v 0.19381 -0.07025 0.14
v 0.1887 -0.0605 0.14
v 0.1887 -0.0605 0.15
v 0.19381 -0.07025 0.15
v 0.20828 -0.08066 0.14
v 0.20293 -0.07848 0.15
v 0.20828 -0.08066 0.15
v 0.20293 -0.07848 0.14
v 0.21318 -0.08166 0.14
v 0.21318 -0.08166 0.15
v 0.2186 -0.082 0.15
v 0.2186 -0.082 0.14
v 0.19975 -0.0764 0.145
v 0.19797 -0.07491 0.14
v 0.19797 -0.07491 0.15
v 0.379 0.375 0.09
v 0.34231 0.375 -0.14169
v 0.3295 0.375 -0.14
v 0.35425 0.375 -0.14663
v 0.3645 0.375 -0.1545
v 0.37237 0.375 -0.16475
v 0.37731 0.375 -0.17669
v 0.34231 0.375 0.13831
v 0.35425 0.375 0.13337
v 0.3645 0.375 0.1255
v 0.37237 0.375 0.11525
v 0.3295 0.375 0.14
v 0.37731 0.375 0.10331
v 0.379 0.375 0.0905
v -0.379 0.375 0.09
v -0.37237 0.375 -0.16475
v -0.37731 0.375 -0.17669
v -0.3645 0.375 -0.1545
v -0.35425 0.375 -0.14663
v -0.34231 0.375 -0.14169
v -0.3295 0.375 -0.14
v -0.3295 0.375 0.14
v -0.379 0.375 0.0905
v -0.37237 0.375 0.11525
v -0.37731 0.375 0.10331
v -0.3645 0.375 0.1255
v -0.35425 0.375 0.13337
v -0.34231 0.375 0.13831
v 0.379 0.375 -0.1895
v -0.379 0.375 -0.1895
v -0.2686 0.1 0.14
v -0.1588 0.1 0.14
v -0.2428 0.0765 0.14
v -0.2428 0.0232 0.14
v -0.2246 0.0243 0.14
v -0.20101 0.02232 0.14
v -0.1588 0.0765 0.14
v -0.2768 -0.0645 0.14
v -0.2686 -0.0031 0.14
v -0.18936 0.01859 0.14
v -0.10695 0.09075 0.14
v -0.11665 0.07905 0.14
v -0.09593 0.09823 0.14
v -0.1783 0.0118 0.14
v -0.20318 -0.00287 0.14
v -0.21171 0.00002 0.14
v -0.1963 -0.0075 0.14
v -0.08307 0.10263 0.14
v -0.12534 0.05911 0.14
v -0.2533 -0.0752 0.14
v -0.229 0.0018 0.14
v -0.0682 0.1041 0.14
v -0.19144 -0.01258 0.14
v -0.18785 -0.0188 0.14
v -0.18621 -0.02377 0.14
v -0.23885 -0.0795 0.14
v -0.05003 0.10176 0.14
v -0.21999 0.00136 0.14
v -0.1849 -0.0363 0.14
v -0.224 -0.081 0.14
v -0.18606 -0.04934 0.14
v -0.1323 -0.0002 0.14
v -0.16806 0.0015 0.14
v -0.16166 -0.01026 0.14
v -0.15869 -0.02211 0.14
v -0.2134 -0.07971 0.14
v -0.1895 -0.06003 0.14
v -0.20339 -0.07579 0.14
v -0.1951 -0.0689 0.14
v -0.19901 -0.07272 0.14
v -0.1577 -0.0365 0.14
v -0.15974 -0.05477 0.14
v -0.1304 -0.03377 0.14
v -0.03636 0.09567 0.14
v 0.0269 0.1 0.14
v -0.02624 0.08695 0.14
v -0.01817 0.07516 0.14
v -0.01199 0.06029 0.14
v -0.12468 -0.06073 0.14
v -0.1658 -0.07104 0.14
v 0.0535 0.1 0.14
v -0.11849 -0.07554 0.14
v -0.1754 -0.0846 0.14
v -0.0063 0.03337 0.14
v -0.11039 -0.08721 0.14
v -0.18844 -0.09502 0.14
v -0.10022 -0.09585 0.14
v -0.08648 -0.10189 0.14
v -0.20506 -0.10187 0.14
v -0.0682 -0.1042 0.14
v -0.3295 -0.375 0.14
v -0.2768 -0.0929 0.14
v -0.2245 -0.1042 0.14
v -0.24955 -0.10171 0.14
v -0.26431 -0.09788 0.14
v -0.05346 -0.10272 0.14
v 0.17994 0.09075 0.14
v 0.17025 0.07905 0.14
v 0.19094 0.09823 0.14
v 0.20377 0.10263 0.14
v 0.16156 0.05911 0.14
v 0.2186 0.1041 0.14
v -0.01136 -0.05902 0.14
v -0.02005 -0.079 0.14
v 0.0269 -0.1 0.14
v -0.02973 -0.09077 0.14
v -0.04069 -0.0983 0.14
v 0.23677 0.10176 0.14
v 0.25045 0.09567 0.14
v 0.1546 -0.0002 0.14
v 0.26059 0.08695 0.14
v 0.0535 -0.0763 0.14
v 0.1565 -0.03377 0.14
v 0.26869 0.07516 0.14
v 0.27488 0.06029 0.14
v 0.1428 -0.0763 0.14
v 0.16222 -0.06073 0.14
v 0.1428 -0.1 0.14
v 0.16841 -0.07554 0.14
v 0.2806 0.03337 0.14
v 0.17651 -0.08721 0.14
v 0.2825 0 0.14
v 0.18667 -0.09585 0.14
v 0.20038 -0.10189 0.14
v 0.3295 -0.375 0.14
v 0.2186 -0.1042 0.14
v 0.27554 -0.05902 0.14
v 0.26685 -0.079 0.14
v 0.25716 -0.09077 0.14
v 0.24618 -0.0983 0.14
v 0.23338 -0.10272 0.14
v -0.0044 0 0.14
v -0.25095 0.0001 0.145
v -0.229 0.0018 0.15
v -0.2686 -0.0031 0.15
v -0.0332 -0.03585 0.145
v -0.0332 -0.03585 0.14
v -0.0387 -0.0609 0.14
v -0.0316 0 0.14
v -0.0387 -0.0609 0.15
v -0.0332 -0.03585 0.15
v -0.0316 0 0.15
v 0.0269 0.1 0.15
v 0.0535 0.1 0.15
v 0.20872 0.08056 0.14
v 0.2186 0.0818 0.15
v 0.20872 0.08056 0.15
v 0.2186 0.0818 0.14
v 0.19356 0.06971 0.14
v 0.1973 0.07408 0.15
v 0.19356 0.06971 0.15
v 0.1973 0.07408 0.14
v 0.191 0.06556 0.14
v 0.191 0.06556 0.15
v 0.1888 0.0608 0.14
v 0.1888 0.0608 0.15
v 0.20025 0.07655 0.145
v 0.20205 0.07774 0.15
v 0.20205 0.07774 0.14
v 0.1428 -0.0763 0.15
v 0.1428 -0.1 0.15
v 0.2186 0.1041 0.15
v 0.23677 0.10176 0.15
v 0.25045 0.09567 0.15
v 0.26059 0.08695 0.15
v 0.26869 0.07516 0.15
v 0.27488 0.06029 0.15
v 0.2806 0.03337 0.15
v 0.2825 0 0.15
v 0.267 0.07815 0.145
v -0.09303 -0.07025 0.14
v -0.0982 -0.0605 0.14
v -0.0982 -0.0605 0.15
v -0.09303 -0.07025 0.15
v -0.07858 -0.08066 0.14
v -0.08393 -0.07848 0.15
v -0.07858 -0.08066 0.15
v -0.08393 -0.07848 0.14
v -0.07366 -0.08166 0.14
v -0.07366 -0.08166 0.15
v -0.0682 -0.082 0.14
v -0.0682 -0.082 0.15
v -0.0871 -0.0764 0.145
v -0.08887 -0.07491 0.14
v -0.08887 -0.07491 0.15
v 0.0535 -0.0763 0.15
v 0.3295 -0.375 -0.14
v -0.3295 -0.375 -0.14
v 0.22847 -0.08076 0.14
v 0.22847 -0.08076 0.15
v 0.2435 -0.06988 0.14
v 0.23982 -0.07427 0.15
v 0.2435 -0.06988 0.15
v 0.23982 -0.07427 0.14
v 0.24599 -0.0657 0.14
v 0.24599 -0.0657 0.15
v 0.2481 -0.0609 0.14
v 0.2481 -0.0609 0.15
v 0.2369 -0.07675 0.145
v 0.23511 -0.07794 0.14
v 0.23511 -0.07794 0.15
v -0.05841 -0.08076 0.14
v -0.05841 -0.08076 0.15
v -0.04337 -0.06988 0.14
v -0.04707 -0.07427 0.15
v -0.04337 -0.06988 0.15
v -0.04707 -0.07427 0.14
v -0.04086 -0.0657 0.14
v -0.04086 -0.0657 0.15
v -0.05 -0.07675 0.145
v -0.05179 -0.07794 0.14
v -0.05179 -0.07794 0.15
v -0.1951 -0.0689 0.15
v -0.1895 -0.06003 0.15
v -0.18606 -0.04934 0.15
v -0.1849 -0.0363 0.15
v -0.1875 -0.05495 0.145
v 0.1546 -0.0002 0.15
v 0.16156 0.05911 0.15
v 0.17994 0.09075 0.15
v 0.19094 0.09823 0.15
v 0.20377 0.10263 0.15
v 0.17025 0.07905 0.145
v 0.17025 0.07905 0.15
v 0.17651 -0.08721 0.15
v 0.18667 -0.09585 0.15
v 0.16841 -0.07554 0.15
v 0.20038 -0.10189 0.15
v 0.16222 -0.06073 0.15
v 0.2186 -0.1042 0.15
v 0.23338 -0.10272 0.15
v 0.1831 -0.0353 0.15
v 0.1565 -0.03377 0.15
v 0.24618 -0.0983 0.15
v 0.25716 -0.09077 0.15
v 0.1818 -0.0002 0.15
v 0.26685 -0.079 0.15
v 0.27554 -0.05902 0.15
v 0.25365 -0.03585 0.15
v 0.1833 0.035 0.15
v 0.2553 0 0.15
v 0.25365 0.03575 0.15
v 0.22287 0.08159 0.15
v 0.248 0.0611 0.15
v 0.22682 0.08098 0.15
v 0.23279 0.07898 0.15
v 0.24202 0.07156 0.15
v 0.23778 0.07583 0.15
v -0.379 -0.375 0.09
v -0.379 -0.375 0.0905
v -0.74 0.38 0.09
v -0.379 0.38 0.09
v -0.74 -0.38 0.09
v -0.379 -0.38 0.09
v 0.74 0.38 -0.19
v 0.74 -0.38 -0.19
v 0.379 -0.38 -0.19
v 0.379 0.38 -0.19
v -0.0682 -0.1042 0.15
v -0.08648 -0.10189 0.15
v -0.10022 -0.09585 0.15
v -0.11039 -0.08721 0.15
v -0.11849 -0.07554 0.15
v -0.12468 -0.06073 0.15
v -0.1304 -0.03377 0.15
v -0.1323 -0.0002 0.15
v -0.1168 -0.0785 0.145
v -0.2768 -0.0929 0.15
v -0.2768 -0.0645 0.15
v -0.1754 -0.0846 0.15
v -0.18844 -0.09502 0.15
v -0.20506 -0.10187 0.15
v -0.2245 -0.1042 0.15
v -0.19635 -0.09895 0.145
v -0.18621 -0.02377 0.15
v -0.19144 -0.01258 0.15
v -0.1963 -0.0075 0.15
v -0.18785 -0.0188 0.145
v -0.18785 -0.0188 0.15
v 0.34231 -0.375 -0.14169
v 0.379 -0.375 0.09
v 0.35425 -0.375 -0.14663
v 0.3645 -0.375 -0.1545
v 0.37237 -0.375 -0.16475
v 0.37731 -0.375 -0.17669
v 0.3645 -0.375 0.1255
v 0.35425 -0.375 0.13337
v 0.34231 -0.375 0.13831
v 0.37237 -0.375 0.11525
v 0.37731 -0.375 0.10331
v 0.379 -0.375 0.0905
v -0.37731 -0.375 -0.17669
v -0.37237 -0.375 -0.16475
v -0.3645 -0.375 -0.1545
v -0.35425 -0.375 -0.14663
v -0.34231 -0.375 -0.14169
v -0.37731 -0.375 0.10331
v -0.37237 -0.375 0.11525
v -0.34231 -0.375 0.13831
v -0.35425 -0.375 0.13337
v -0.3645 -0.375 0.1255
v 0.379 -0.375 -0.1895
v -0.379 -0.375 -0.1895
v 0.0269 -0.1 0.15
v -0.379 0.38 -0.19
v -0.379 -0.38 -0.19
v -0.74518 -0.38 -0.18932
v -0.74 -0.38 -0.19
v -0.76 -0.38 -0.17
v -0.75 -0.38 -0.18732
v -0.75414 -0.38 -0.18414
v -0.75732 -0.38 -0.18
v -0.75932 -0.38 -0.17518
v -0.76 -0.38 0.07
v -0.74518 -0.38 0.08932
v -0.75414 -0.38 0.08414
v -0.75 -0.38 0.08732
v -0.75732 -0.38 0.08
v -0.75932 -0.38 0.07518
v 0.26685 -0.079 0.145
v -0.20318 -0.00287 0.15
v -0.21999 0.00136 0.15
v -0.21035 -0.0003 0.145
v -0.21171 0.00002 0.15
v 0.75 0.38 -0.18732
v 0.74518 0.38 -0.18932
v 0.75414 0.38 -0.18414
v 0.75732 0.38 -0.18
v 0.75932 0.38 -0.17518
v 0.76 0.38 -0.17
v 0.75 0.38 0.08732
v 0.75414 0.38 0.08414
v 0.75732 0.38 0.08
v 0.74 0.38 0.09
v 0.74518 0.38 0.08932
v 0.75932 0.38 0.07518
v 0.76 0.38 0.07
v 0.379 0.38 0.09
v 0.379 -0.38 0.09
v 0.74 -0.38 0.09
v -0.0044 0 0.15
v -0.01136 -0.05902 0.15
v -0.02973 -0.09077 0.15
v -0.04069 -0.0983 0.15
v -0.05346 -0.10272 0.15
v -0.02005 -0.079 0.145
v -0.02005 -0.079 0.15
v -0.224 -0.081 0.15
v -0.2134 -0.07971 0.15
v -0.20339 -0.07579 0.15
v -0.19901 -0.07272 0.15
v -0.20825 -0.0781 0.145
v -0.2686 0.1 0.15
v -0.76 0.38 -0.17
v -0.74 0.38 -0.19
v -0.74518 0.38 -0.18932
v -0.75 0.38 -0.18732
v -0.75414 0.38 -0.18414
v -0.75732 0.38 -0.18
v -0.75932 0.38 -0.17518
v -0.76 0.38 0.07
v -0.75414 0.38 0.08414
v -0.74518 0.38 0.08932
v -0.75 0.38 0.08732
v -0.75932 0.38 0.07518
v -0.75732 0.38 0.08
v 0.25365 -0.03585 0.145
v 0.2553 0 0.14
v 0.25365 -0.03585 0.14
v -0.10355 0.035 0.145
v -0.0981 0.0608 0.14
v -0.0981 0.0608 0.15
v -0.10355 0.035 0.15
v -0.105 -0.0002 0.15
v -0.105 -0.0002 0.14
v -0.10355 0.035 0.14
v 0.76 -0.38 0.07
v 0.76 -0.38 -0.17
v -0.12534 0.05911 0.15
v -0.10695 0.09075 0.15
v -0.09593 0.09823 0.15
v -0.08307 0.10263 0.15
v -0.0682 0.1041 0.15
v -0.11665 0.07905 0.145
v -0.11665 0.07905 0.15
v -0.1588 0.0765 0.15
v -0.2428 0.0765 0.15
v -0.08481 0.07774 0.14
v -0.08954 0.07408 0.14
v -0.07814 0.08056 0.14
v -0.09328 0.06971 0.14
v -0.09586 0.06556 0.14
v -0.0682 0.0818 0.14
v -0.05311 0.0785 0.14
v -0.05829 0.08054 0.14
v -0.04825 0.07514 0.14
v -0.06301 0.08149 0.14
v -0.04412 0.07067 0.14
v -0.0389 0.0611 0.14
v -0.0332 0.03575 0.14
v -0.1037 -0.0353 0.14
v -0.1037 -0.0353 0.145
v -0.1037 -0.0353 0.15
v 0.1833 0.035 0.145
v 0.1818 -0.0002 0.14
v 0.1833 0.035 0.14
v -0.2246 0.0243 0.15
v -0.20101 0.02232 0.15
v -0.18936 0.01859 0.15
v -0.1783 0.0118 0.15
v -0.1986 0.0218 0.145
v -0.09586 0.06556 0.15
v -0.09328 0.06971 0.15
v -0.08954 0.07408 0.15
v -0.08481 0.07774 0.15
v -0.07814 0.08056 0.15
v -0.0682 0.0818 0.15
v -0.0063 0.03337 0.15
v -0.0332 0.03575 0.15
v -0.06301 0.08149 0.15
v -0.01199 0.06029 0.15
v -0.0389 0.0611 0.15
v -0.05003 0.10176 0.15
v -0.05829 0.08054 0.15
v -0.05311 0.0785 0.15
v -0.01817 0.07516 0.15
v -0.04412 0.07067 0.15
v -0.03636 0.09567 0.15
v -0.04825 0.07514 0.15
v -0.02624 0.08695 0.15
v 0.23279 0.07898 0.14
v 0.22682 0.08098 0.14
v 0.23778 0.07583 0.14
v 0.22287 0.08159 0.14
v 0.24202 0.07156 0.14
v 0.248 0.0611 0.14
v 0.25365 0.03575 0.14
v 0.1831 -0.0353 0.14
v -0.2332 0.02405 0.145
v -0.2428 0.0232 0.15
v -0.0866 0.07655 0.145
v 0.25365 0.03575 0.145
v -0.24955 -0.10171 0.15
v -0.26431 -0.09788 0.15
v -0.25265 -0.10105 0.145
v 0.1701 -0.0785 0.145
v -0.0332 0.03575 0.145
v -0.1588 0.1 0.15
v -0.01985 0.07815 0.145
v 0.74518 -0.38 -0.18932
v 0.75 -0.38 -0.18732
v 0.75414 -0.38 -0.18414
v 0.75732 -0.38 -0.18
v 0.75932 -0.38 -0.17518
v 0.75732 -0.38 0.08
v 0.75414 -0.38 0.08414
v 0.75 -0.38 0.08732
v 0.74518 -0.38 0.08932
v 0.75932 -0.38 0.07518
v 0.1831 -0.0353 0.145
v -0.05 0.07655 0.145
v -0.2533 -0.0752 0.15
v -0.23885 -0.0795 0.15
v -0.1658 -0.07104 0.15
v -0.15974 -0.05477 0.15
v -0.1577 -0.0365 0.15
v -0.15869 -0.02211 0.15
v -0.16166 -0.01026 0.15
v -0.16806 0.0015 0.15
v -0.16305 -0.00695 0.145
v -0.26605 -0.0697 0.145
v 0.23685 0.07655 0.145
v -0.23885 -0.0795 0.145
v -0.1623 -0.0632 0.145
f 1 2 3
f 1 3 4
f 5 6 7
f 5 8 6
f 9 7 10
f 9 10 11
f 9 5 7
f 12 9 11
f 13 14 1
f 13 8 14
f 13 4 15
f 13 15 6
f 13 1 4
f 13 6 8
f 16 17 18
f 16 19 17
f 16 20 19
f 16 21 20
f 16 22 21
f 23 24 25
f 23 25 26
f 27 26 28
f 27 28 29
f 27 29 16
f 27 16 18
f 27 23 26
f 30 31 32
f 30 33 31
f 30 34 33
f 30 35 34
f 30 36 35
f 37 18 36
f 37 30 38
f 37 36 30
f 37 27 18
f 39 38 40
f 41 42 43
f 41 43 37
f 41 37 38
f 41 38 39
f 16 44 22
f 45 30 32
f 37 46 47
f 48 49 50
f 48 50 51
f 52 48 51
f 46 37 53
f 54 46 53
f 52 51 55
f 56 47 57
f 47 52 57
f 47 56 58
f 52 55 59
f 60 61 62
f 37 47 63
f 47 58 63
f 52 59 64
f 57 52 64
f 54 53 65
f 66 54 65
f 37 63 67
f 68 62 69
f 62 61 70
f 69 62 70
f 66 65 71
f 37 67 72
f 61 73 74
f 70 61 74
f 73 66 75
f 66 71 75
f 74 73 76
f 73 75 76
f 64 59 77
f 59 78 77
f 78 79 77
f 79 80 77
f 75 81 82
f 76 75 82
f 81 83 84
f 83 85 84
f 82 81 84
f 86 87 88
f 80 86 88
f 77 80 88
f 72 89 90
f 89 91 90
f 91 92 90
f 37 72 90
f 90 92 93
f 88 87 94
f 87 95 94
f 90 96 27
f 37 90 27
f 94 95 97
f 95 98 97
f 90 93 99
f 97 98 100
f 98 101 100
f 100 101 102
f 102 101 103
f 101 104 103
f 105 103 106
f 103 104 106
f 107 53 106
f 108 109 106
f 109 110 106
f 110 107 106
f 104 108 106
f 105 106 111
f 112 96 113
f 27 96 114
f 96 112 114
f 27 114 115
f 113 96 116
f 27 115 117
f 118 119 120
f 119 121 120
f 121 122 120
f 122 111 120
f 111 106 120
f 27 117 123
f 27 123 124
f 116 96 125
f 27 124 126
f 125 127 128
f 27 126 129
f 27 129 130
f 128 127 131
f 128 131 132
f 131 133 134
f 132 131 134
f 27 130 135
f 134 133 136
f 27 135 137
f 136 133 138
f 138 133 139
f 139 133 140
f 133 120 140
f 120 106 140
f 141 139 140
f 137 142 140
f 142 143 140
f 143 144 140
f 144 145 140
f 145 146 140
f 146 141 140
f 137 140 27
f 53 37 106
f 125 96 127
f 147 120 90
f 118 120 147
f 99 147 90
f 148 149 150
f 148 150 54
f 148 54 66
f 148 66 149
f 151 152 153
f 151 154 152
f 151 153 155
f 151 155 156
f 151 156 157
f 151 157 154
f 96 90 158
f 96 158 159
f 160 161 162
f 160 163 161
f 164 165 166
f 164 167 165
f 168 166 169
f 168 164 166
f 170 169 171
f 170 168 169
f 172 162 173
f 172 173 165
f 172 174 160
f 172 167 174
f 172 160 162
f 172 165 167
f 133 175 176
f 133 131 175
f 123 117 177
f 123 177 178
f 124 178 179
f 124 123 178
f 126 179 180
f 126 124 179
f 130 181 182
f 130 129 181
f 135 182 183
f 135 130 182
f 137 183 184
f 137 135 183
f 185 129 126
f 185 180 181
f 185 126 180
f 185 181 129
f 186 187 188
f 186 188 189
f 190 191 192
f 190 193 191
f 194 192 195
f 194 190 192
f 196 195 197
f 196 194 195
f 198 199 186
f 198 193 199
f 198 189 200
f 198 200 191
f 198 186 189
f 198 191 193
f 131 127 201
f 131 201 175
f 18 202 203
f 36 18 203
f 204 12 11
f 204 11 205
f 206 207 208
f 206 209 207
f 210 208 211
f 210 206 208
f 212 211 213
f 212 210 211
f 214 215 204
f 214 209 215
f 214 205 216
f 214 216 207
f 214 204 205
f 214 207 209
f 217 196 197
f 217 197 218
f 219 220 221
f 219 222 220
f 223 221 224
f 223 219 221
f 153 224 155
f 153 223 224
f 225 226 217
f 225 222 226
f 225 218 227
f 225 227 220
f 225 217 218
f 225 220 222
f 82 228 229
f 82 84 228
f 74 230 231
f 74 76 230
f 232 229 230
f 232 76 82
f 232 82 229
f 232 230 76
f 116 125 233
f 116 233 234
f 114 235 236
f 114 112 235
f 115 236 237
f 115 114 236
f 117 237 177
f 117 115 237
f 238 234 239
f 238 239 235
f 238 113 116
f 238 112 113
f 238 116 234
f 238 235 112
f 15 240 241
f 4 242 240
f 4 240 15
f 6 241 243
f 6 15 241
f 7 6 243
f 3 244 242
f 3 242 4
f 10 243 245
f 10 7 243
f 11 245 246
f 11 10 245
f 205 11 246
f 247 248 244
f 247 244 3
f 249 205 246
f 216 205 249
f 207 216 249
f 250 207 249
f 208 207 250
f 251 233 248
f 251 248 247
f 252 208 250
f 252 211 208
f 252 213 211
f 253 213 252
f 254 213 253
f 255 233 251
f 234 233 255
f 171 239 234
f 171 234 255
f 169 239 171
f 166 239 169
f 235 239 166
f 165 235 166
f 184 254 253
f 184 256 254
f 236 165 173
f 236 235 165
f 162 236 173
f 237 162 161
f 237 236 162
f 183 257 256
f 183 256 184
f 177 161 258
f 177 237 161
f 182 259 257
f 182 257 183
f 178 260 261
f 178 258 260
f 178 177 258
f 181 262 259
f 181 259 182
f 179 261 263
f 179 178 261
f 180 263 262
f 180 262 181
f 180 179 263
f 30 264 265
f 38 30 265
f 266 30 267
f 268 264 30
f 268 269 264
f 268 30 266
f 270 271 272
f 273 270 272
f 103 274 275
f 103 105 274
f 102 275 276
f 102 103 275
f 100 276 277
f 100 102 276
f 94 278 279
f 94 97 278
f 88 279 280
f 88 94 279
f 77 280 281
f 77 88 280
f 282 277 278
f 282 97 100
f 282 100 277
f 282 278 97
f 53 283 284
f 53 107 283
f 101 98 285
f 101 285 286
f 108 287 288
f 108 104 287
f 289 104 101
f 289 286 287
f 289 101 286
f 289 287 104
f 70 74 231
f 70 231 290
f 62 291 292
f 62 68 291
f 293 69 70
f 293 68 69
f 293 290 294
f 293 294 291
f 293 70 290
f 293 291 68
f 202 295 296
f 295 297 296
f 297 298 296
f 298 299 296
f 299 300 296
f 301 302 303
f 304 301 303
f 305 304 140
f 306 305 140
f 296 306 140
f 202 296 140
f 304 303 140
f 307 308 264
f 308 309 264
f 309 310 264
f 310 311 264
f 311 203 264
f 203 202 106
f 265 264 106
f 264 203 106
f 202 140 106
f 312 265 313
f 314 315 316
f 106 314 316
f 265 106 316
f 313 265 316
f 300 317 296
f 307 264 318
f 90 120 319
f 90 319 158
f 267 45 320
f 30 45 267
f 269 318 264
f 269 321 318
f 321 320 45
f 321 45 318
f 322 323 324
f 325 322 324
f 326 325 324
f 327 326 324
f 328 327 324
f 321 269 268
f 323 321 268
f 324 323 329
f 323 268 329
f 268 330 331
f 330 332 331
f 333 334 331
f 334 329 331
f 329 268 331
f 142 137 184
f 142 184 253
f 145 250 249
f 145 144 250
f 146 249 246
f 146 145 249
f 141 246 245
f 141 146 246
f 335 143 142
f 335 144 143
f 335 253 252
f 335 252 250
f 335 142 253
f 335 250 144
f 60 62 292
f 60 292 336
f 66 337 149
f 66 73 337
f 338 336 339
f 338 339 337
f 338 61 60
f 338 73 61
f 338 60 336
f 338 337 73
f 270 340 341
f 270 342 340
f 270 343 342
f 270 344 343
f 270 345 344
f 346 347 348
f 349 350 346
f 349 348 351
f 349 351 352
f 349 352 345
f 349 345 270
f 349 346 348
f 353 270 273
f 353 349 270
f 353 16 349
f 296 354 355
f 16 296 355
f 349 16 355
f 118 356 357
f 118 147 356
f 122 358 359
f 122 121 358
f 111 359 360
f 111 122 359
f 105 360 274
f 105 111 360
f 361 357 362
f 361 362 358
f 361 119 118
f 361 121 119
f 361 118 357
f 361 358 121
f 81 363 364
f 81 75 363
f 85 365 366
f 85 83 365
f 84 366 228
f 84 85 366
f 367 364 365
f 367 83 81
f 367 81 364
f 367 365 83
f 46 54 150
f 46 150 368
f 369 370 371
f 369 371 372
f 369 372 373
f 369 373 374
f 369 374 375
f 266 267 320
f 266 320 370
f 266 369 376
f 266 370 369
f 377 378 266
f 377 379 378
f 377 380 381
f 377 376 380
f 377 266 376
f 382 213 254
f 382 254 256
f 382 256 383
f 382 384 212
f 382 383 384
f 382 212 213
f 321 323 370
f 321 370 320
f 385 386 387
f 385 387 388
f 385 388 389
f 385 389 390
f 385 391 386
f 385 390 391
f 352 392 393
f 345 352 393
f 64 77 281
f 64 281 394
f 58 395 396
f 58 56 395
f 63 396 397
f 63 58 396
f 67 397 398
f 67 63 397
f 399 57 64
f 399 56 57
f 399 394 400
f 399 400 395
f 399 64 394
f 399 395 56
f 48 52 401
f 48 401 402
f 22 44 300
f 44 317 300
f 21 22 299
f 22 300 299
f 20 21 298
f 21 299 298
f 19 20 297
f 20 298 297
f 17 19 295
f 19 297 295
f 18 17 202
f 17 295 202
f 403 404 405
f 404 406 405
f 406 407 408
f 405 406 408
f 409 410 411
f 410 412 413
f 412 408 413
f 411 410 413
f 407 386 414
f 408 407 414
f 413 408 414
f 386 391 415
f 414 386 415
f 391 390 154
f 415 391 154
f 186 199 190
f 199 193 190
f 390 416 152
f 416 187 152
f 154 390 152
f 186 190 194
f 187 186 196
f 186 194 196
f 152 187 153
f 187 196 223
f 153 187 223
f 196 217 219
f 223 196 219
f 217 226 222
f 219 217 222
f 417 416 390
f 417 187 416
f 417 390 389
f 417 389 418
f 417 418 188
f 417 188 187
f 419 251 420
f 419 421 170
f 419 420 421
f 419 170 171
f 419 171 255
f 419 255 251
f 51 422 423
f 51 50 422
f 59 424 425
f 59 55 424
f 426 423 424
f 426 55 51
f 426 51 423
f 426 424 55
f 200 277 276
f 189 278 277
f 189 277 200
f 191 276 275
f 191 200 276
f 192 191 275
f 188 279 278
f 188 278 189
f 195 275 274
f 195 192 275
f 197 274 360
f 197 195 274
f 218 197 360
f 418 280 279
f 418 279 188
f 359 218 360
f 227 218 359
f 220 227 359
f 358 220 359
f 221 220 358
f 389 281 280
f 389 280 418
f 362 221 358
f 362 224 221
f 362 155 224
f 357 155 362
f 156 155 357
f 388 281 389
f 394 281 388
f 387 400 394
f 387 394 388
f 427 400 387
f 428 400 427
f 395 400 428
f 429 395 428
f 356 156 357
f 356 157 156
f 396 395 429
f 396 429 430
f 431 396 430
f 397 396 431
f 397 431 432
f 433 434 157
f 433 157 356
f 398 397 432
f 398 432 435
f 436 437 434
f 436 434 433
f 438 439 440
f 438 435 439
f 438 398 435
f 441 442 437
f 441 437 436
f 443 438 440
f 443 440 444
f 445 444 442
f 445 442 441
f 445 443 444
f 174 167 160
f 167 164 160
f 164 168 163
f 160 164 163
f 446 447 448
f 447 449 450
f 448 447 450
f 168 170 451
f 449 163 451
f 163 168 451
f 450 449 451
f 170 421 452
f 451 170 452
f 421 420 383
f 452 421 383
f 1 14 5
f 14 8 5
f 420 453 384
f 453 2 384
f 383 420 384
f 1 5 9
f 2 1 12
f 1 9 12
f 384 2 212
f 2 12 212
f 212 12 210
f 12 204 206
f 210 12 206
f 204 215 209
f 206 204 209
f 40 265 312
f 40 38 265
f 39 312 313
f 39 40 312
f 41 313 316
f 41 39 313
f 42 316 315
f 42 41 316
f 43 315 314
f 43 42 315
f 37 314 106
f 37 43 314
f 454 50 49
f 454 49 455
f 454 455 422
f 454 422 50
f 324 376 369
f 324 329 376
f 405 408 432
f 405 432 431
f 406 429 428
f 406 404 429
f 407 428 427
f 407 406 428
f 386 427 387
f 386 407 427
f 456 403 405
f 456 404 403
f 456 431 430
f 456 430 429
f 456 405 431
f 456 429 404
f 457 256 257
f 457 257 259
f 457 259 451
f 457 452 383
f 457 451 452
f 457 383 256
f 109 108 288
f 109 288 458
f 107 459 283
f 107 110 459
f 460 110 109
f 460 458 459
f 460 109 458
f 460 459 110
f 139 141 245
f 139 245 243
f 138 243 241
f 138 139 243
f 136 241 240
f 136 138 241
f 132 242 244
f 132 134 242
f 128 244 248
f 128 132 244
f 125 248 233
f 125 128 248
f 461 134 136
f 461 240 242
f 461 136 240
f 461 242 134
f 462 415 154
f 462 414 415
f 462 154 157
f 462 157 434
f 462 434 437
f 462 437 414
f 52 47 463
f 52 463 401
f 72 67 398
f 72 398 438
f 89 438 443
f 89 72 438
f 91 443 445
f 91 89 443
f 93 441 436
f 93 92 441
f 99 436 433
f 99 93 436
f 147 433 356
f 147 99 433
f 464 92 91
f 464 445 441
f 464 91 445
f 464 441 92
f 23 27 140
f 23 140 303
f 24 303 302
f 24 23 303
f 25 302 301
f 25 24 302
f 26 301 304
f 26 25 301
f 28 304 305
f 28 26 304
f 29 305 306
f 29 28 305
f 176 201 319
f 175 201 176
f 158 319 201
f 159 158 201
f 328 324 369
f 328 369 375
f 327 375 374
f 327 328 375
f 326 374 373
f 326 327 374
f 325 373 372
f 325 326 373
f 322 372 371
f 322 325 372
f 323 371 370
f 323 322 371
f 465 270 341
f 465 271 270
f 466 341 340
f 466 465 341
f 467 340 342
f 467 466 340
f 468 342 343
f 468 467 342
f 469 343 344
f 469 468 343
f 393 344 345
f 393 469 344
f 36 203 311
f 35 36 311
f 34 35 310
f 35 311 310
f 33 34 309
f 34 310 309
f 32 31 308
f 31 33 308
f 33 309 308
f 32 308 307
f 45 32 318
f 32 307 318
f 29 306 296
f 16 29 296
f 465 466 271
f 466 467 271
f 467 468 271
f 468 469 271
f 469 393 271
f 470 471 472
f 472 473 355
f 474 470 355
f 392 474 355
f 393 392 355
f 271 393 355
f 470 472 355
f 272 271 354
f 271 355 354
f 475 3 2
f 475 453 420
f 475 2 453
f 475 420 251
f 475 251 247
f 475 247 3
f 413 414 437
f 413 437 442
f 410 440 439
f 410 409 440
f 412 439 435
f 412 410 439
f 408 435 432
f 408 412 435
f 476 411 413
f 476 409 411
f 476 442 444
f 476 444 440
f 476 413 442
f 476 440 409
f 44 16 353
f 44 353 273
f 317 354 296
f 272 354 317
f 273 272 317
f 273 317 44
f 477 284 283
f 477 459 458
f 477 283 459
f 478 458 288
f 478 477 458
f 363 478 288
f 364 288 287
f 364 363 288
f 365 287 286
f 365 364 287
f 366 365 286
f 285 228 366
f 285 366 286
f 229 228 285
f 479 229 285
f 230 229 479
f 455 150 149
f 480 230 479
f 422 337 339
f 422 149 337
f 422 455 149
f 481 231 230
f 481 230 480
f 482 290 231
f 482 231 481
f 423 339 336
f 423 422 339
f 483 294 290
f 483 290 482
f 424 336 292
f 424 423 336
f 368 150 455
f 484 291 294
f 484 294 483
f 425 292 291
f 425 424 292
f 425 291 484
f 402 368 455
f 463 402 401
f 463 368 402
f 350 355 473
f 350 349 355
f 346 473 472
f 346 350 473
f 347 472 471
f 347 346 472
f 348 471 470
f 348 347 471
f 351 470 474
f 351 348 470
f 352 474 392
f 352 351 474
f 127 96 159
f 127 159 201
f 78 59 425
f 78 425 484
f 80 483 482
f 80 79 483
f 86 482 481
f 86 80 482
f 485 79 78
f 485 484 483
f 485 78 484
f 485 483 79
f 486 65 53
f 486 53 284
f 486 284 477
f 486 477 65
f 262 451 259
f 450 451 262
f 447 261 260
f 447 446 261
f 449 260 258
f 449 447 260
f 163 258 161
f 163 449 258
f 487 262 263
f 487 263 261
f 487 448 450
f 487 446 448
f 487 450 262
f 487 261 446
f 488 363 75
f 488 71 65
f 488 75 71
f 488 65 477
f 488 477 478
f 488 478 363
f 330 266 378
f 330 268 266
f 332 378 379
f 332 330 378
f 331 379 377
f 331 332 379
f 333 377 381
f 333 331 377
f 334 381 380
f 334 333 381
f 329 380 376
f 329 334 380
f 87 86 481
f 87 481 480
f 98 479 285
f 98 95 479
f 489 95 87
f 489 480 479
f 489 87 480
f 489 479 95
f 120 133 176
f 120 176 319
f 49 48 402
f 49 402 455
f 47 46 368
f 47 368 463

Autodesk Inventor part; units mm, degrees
ref_plane "YZ Plane" through (0, 0, 0) normal (1, 0, 0) x (0, 1, 0)
ref_plane "XZ Plane" through (0, 0, 0) normal (0, 1, 0) x (-1, 0, 0)
ref_plane "XY Plane" through (0, 0, 0) normal (0, 0, 1) x (1, 0, 0)
sketch "Sketch1" plane through (0, 0, 0) normal (0, 1, 0) x (-1, 0, 0)
  line L0 (0.379, 0.14) -> (-0.379, 0.14)
  line L1 (-0.379, 0.14) -> (-0.379, -0.14)
  line L2 (-0.379, -0.14) -> (0.379, -0.14)
  line L3 (0.379, -0.14) -> (0.379, 0.14)
  line L4 (0.379, 0.09) -> (0.76, 0.09)
  line L5 (0.76, 0.09) -> (0.76, -0.19)
  line L6 (0.76, -0.19) -> (0.379, -0.19)
  line L7 (0.379, -0.19) -> (0.379, 0.09)
  line L8 (-0.379, 0.09) -> (-0.76, 0.09)
  line L9 (-0.76, 0.09) -> (-0.76, -0.19)
  line L10 (-0.76, -0.19) -> (-0.379, -0.19)
  line L11 (-0.379, -0.19) -> (-0.379, 0.09)
  point P0 (0, 0)
  point P1 (0, 0.14)
  point P2 (0.379, 0)
  dimension "d0" = 0.381
  dimension "d1" = 1.52
  dimension "d2" = 0.05
  dimension "d3" = 0.33
  dimension "d4" = 0.05
extrude "Extrusion1" add sketch "Sketch1" along normal mid plane 0.76 contours L4 L5 L6 L7 L3 | L1 L11 L10 L9 L8
extrude "Extrusion2" add sketch "Sketch1" along normal mid plane 0.75 contours L3 L2 L1 L0
fillet "Fillet1" radius 0.05 4 edges at (0.379, 0, 0.14) (-0.379, 0, 0.14) (-0.379, 0, -0.14) (0.379, 0, -0.14)
fillet "Fillet2" radius 0.02 4 edges at (-0.76, 0, 0.09) (-0.76, 0, -0.19) (0.76, 0, 0.09) (0.76, 0, -0.19)
sketch "Sketch2" plane through (-0.329, -0.375, 0.14) normal (0, 0, 1) x (1, 0, 0)
  line L0 (0, 0) -> (0, 0.75) projected
  line L1 (0.658, 0) -> (0, 0) projected
  line L2 (0.658, 0.75) -> (0.658, 0) projected
  line L3 (0, 0.75) -> (0.658, 0.75) construction
  line L4 (0, 0.375) -> (0.658, 0.375) construction
  spline S0 degree 2 poles (0.1713, 0.3385) (0.1713, 0.3241) (0.1621, 0.2995) (0.1536, 0.2904) knots 0 0 0 1 2 2 2
  spline S1 degree 2 poles (0.1536, 0.2904) (0.1452, 0.2813) (0.1201, 0.2708) (0.1045, 0.2708) knots 0 0 0 1 2 2 2
  spline S2 degree 2 poles (0.1045, 0.2708) (0.0903, 0.2708) (0.0624, 0.2771) (0.0522, 0.2821) knots 0 0 0 1 2 2 2
  line L5 (0.0522, 0.2821) -> (0.0522, 0.3105)
  line L6 (0.0522, 0.3105) -> (0.0541, 0.3105)
  spline S3 degree 2 poles (0.0541, 0.3105) (0.0572, 0.3082) (0.0687, 0.3024) (0.0757, 0.2998) knots 0 0 0 1 2 2 2
  spline S4 degree 2 poles (0.0757, 0.2998) (0.0836, 0.297) (0.0967, 0.294) (0.105, 0.294) knots 0 0 0 1 2 2 2
  spline S5 degree 2 poles (0.105, 0.294) (0.1131, 0.294) (0.1284, 0.2998) (0.1339, 0.3061) knots 0 0 0 1 2 2 2
  spline S6 degree 2 poles (0.1339, 0.3061) (0.1389, 0.3121) (0.1441, 0.328) (0.1441, 0.3387) knots 0 0 0 1 2 2 2
  spline S7 degree 2 poles (0.1441, 0.3387) (0.1441, 0.3494) (0.1382, 0.363) (0.1327, 0.3675) knots 0 0 0 1 2 2 2
  spline S8 degree 2 poles (0.1327, 0.3675) (0.1271, 0.3726) (0.1102, 0.3768) (0.1, 0.3768) knots 0 0 0 1 2 2 2
  spline S9 degree 2 poles (0.1, 0.3768) (0.089, 0.3768) (0.0671, 0.3734) (0.0604, 0.3719) knots 0 0 0 1 2 2 2
  line L7 (0.0604, 0.3719) -> (0.0604, 0.475)
  line L8 (0.0604, 0.475) -> (0.1702, 0.475)
  line L9 (0.1702, 0.475) -> (0.1702, 0.4515)
  line L10 (0.1702, 0.4515) -> (0.0862, 0.4515)
  line L11 (0.0862, 0.4515) -> (0.0862, 0.3982)
  spline S10 degree 2 poles (0.0862, 0.3982) (0.0911, 0.3988) (0.1005, 0.3993) (0.1044, 0.3993) knots 0 0 0 1 2 2 2
  spline S11 degree 2 poles (0.1044, 0.3993) (0.1198, 0.3993) (0.141, 0.3943) (0.1507, 0.3868) knots 0 0 0 1 2 2 2
  spline S12 degree 2 poles (0.1507, 0.3868) (0.1606, 0.3794) (0.1713, 0.3567) (0.1713, 0.3385) knots 0 0 0 1 2 2 2
  spline S13 degree 2 poles (0.3246, 0.375) (0.3246, 0.3212) (0.2933, 0.2708) (0.2608, 0.2708) knots 0 0 0 1 2 2 2
  spline S14 degree 2 poles (0.2608, 0.2708) (0.2277, 0.2708) (0.1967, 0.3222) (0.1967, 0.3748) knots 0 0 0 1 2 2 2
  spline S15 degree 2 poles (0.1967, 0.3748) (0.1967, 0.429) (0.228, 0.4791) (0.2608, 0.4791) knots 0 0 0 1 2 2 2
  spline S16 degree 2 poles (0.2608, 0.4791) (0.2937, 0.4791) (0.3246, 0.4272) (0.3246, 0.375) knots 0 0 0 1 2 2 2
  spline S17 degree 2 poles (0.2903, 0.3141) (0.2942, 0.3239) (0.2974, 0.3544) (0.2974, 0.375) knots 0 0 0 1 2 2 2
  spline S18 degree 2 poles (0.2974, 0.375) (0.2974, 0.3956) (0.2942, 0.4259) (0.2901, 0.4361) knots 0 0 0 1 2 2 2
  spline S19 degree 2 poles (0.2901, 0.4361) (0.2861, 0.4463) (0.2719, 0.4568) (0.2608, 0.4568) knots 0 0 0 1 2 2 2
  spline S20 degree 2 poles (0.2608, 0.4568) (0.2496, 0.4568) (0.2352, 0.4463) (0.2309, 0.4358) knots 0 0 0 1 2 2 2
  spline S21 degree 2 poles (0.2309, 0.4358) (0.2269, 0.4256) (0.224, 0.3944) (0.224, 0.3748) knots 0 0 0 1 2 2 2
  spline S22 degree 2 poles (0.224, 0.3748) (0.224, 0.3538) (0.2266, 0.3256) (0.2308, 0.3145) knots 0 0 0 1 2 2 2
  spline S23 degree 2 poles (0.2308, 0.3145) (0.2347, 0.3042) (0.2491, 0.293) (0.2608, 0.293) knots 0 0 0 1 2 2 2
  spline S24 degree 2 poles (0.2608, 0.293) (0.2718, 0.293) (0.2862, 0.3035) (0.2903, 0.3141) knots 0 0 0 1 2 2 2
  line L12 (0.4718, 0.275) -> (0.3559, 0.275)
  line L13 (0.3559, 0.275) -> (0.3559, 0.475)
  line L14 (0.3559, 0.475) -> (0.3825, 0.475)
  line L15 (0.3825, 0.475) -> (0.3825, 0.2987)
  line L16 (0.3825, 0.2987) -> (0.4718, 0.2987)
  line L17 (0.4718, 0.2987) -> (0.4718, 0.275)
  spline S25 degree 2 poles (0.6115, 0.375) (0.6115, 0.3212) (0.5802, 0.2708) (0.5476, 0.2708) knots 0 0 0 1 2 2 2
  spline S26 degree 2 poles (0.5476, 0.2708) (0.5146, 0.2708) (0.4836, 0.3222) (0.4836, 0.3748) knots 0 0 0 1 2 2 2
  spline S27 degree 2 poles (0.4836, 0.3748) (0.4836, 0.429) (0.5149, 0.4791) (0.5476, 0.4791) knots 0 0 0 1 2 2 2
  spline S28 degree 2 poles (0.5476, 0.4791) (0.5805, 0.4791) (0.6115, 0.4272) (0.6115, 0.375) knots 0 0 0 1 2 2 2
  spline S29 degree 2 poles (0.5771, 0.3141) (0.581, 0.3239) (0.5843, 0.3544) (0.5843, 0.375) knots 0 0 0 1 2 2 2
  spline S30 degree 2 poles (0.5843, 0.375) (0.5843, 0.3956) (0.581, 0.4259) (0.577, 0.4361) knots 0 0 0 1 2 2 2
  spline S31 degree 2 poles (0.577, 0.4361) (0.5729, 0.4463) (0.5588, 0.4568) (0.5476, 0.4568) knots 0 0 0 1 2 2 2
  spline S32 degree 2 poles (0.5476, 0.4568) (0.5365, 0.4568) (0.522, 0.4463) (0.5178, 0.4358) knots 0 0 0 1 2 2 2
  spline S33 degree 2 poles (0.5178, 0.4358) (0.5138, 0.4256) (0.5108, 0.3944) (0.5108, 0.3748) knots 0 0 0 1 2 2 2
  spline S34 degree 2 poles (0.5108, 0.3748) (0.5108, 0.3538) (0.5134, 0.3256) (0.5177, 0.3145) knots 0 0 0 1 2 2 2
  spline S35 degree 2 poles (0.5177, 0.3145) (0.5215, 0.3042) (0.536, 0.293) (0.5476, 0.293) knots 0 0 0 1 2 2 2
  spline S36 degree 2 poles (0.5476, 0.293) (0.5587, 0.293) (0.5731, 0.3035) (0.5771, 0.3141) knots 0 0 0 1 2 2 2
  point P0 (0.329, 0.375)
extrude "Extrusion3" add sketch "Sketch2" along normal blind 0.01
properties part number "21-0.05" material "Copper"
